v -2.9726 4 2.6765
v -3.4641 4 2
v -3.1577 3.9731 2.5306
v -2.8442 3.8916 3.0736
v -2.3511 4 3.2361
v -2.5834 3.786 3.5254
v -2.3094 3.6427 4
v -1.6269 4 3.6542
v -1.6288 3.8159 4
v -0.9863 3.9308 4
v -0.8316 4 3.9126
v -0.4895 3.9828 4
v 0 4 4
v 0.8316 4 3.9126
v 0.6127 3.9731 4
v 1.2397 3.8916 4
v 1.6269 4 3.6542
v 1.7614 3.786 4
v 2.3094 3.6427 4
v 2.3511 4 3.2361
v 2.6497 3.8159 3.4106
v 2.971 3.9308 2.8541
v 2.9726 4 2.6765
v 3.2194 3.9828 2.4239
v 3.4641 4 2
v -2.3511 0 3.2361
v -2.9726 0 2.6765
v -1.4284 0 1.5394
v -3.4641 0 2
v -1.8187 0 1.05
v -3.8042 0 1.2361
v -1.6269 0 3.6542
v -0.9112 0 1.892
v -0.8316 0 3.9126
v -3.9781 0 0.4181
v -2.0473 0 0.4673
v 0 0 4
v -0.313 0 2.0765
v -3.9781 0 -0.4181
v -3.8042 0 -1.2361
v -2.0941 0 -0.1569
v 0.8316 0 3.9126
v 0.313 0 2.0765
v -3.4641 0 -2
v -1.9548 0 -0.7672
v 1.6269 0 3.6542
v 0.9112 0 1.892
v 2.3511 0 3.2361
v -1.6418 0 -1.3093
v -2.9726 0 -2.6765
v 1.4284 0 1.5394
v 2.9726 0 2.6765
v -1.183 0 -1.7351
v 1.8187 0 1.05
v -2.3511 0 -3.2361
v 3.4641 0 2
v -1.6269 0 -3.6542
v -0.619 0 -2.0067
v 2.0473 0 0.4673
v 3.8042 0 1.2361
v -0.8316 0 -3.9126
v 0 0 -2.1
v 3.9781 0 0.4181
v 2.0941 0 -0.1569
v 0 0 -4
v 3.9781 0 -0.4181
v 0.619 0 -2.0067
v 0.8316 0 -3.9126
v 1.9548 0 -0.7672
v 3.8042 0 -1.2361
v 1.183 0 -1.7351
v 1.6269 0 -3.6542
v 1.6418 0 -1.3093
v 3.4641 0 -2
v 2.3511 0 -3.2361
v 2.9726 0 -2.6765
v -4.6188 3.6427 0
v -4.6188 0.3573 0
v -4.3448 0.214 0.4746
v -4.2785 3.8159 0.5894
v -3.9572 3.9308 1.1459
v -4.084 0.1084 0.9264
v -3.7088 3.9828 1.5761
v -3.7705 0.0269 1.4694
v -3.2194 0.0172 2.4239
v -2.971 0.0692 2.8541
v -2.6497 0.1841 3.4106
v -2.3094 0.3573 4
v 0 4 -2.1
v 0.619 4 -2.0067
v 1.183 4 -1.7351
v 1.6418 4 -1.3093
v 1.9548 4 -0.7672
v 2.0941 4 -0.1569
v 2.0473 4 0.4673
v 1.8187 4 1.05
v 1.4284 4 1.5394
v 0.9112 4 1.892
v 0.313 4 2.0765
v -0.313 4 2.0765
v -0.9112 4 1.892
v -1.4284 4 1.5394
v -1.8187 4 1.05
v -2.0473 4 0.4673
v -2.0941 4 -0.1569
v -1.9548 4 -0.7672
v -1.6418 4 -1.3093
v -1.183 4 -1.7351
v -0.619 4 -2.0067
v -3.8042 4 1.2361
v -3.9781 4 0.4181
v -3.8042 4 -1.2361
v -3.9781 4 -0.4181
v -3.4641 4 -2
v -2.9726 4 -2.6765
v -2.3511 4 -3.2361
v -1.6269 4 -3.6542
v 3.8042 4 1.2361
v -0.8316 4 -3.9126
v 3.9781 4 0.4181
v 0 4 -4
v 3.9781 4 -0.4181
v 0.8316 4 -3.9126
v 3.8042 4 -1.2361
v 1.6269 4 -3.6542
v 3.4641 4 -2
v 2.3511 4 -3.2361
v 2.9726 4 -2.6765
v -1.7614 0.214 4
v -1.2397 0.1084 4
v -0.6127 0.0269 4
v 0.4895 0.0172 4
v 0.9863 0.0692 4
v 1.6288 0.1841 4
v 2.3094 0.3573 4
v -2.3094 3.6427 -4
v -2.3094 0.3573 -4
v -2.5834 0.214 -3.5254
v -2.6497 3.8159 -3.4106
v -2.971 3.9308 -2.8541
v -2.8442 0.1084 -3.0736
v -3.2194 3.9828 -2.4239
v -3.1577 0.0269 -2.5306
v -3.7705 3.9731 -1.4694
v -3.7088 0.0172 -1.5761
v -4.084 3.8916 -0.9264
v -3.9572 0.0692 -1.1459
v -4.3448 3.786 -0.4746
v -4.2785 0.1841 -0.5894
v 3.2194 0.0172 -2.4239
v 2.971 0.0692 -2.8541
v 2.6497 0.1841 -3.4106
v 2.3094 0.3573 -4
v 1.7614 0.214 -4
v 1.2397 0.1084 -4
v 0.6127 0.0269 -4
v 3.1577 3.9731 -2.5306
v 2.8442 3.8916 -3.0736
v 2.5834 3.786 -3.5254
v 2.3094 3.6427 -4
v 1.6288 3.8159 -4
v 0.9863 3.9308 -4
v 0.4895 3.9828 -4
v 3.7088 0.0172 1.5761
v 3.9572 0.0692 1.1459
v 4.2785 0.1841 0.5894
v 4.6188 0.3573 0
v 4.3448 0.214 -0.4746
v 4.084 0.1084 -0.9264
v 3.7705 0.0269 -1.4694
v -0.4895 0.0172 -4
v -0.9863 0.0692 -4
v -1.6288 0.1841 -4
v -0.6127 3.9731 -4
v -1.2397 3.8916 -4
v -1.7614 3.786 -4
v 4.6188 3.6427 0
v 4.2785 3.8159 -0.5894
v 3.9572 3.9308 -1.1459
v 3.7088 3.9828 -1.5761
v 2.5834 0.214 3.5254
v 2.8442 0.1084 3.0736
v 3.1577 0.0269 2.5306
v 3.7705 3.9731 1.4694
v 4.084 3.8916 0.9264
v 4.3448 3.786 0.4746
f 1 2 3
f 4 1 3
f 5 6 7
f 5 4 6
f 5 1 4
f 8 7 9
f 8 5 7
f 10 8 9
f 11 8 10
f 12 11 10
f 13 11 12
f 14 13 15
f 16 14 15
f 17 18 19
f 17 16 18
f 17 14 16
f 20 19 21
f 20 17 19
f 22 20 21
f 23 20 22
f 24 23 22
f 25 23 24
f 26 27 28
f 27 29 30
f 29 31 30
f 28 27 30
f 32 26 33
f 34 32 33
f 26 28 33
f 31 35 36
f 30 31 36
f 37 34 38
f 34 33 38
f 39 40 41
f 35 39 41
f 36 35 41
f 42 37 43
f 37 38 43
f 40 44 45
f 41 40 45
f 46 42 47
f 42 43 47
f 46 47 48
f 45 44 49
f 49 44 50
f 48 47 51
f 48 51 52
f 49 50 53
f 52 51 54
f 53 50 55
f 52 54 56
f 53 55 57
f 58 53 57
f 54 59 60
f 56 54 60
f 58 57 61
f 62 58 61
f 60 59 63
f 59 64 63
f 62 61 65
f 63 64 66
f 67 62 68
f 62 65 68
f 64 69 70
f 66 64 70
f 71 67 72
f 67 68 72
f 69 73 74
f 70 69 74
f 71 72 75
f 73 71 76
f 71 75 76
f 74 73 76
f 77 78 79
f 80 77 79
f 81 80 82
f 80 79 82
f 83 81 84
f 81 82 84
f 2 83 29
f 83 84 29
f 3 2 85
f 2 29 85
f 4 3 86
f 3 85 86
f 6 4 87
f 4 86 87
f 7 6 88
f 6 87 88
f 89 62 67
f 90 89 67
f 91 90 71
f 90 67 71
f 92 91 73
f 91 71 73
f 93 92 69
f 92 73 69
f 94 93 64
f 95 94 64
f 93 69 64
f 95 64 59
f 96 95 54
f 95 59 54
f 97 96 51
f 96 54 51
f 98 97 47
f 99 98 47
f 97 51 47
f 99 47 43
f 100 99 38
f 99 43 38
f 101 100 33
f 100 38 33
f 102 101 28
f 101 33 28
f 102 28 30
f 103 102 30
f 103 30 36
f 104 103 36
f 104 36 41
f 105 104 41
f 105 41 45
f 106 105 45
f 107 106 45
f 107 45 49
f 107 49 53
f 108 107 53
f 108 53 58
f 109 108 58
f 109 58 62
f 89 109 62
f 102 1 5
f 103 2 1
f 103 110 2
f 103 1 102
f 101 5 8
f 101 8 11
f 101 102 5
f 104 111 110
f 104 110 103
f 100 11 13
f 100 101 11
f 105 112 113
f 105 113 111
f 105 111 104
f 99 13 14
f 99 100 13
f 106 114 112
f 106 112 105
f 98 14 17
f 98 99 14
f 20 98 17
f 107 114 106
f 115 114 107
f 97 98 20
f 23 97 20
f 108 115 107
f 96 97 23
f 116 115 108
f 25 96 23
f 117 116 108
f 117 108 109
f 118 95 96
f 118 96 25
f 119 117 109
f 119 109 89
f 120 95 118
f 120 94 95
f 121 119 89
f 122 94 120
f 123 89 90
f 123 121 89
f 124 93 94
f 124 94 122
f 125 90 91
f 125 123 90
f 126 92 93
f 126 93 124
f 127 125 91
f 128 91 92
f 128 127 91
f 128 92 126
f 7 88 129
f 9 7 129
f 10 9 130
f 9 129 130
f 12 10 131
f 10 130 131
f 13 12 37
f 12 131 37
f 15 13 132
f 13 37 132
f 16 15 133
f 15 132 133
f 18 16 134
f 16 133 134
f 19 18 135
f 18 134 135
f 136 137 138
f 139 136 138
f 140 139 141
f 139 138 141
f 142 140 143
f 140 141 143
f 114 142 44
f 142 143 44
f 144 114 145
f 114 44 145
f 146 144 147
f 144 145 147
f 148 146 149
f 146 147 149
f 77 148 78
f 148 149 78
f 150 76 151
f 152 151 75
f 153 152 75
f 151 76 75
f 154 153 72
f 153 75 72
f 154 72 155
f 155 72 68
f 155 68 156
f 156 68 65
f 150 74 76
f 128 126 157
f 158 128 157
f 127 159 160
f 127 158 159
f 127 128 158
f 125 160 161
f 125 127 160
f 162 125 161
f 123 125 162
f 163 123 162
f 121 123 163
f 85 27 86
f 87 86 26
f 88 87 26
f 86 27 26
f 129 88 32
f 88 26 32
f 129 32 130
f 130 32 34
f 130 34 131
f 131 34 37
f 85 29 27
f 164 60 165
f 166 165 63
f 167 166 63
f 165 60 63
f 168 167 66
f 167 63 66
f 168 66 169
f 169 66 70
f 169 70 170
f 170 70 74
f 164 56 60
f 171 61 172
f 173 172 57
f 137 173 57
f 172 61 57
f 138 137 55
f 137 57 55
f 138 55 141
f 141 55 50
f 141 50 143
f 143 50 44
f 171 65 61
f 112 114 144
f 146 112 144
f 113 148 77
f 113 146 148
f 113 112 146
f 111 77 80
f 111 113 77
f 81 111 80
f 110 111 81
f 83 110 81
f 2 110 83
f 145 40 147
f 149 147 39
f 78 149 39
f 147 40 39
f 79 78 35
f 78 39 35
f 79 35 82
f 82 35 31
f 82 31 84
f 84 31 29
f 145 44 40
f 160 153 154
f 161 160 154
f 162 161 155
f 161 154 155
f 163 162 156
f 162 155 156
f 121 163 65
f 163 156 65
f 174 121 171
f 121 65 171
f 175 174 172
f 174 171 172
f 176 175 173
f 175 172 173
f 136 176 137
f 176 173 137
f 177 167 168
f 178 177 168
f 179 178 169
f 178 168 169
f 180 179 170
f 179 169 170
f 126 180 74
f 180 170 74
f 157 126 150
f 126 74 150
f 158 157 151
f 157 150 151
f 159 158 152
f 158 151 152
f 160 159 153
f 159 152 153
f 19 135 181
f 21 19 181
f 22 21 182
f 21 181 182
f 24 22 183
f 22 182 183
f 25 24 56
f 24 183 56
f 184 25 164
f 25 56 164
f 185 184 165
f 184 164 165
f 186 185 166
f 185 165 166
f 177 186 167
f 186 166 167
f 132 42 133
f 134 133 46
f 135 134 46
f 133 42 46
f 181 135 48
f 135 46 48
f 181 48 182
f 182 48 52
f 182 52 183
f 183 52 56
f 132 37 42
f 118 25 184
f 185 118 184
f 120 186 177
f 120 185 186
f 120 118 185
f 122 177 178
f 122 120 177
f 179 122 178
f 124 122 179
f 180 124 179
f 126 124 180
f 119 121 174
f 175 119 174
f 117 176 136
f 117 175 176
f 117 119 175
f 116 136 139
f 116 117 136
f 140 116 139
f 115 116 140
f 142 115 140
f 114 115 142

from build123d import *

# Parameters (mm, degrees)
BOSS_EXTRUDE1_DEPTH = 4
M5_TAPPED_HOLE1_D   = 4.2


with BuildPart() as part:
    # Sketch1 → Boss-Extrude1 (new body)
    with BuildSketch(Plane(origin=(0, 0, 0), x_dir=(1, 0, 0), z_dir=(0, 1, 0))):
        Polygon((-2.309401077, -4), (2.309401077, -4), (4.618802154, 0), (2.309401077, 4), (-2.309401077, 4), (-4.618802154, 0), align=None)
    extrude(amount=BOSS_EXTRUDE1_DEPTH)

    # Sketch2 → Cut-Revolve1 (revolve, cut)
    with BuildSketch(Plane(origin=(0, 0, 0), x_dir=(0, 0, -1), z_dir=(1, 0, 0))):
        Polygon((5.752238375, 1.011655298), (4, 0), (5.752238375, 0), align=None)
        Polygon((4, 4), (6.116124346, 4), (6.116124346, 2.778255039), align=None)
    revolve(axis=Axis((0, 0, 0), (0, 1, 0)), mode=Mode.SUBTRACT)

    # M5 Tapped Hole1 (through all)
    with Locations(Plane.ZX.offset(4)):
        with Locations((0, 0)):
            Hole(M5_TAPPED_HOLE1_D / 2)


solid = part.part
